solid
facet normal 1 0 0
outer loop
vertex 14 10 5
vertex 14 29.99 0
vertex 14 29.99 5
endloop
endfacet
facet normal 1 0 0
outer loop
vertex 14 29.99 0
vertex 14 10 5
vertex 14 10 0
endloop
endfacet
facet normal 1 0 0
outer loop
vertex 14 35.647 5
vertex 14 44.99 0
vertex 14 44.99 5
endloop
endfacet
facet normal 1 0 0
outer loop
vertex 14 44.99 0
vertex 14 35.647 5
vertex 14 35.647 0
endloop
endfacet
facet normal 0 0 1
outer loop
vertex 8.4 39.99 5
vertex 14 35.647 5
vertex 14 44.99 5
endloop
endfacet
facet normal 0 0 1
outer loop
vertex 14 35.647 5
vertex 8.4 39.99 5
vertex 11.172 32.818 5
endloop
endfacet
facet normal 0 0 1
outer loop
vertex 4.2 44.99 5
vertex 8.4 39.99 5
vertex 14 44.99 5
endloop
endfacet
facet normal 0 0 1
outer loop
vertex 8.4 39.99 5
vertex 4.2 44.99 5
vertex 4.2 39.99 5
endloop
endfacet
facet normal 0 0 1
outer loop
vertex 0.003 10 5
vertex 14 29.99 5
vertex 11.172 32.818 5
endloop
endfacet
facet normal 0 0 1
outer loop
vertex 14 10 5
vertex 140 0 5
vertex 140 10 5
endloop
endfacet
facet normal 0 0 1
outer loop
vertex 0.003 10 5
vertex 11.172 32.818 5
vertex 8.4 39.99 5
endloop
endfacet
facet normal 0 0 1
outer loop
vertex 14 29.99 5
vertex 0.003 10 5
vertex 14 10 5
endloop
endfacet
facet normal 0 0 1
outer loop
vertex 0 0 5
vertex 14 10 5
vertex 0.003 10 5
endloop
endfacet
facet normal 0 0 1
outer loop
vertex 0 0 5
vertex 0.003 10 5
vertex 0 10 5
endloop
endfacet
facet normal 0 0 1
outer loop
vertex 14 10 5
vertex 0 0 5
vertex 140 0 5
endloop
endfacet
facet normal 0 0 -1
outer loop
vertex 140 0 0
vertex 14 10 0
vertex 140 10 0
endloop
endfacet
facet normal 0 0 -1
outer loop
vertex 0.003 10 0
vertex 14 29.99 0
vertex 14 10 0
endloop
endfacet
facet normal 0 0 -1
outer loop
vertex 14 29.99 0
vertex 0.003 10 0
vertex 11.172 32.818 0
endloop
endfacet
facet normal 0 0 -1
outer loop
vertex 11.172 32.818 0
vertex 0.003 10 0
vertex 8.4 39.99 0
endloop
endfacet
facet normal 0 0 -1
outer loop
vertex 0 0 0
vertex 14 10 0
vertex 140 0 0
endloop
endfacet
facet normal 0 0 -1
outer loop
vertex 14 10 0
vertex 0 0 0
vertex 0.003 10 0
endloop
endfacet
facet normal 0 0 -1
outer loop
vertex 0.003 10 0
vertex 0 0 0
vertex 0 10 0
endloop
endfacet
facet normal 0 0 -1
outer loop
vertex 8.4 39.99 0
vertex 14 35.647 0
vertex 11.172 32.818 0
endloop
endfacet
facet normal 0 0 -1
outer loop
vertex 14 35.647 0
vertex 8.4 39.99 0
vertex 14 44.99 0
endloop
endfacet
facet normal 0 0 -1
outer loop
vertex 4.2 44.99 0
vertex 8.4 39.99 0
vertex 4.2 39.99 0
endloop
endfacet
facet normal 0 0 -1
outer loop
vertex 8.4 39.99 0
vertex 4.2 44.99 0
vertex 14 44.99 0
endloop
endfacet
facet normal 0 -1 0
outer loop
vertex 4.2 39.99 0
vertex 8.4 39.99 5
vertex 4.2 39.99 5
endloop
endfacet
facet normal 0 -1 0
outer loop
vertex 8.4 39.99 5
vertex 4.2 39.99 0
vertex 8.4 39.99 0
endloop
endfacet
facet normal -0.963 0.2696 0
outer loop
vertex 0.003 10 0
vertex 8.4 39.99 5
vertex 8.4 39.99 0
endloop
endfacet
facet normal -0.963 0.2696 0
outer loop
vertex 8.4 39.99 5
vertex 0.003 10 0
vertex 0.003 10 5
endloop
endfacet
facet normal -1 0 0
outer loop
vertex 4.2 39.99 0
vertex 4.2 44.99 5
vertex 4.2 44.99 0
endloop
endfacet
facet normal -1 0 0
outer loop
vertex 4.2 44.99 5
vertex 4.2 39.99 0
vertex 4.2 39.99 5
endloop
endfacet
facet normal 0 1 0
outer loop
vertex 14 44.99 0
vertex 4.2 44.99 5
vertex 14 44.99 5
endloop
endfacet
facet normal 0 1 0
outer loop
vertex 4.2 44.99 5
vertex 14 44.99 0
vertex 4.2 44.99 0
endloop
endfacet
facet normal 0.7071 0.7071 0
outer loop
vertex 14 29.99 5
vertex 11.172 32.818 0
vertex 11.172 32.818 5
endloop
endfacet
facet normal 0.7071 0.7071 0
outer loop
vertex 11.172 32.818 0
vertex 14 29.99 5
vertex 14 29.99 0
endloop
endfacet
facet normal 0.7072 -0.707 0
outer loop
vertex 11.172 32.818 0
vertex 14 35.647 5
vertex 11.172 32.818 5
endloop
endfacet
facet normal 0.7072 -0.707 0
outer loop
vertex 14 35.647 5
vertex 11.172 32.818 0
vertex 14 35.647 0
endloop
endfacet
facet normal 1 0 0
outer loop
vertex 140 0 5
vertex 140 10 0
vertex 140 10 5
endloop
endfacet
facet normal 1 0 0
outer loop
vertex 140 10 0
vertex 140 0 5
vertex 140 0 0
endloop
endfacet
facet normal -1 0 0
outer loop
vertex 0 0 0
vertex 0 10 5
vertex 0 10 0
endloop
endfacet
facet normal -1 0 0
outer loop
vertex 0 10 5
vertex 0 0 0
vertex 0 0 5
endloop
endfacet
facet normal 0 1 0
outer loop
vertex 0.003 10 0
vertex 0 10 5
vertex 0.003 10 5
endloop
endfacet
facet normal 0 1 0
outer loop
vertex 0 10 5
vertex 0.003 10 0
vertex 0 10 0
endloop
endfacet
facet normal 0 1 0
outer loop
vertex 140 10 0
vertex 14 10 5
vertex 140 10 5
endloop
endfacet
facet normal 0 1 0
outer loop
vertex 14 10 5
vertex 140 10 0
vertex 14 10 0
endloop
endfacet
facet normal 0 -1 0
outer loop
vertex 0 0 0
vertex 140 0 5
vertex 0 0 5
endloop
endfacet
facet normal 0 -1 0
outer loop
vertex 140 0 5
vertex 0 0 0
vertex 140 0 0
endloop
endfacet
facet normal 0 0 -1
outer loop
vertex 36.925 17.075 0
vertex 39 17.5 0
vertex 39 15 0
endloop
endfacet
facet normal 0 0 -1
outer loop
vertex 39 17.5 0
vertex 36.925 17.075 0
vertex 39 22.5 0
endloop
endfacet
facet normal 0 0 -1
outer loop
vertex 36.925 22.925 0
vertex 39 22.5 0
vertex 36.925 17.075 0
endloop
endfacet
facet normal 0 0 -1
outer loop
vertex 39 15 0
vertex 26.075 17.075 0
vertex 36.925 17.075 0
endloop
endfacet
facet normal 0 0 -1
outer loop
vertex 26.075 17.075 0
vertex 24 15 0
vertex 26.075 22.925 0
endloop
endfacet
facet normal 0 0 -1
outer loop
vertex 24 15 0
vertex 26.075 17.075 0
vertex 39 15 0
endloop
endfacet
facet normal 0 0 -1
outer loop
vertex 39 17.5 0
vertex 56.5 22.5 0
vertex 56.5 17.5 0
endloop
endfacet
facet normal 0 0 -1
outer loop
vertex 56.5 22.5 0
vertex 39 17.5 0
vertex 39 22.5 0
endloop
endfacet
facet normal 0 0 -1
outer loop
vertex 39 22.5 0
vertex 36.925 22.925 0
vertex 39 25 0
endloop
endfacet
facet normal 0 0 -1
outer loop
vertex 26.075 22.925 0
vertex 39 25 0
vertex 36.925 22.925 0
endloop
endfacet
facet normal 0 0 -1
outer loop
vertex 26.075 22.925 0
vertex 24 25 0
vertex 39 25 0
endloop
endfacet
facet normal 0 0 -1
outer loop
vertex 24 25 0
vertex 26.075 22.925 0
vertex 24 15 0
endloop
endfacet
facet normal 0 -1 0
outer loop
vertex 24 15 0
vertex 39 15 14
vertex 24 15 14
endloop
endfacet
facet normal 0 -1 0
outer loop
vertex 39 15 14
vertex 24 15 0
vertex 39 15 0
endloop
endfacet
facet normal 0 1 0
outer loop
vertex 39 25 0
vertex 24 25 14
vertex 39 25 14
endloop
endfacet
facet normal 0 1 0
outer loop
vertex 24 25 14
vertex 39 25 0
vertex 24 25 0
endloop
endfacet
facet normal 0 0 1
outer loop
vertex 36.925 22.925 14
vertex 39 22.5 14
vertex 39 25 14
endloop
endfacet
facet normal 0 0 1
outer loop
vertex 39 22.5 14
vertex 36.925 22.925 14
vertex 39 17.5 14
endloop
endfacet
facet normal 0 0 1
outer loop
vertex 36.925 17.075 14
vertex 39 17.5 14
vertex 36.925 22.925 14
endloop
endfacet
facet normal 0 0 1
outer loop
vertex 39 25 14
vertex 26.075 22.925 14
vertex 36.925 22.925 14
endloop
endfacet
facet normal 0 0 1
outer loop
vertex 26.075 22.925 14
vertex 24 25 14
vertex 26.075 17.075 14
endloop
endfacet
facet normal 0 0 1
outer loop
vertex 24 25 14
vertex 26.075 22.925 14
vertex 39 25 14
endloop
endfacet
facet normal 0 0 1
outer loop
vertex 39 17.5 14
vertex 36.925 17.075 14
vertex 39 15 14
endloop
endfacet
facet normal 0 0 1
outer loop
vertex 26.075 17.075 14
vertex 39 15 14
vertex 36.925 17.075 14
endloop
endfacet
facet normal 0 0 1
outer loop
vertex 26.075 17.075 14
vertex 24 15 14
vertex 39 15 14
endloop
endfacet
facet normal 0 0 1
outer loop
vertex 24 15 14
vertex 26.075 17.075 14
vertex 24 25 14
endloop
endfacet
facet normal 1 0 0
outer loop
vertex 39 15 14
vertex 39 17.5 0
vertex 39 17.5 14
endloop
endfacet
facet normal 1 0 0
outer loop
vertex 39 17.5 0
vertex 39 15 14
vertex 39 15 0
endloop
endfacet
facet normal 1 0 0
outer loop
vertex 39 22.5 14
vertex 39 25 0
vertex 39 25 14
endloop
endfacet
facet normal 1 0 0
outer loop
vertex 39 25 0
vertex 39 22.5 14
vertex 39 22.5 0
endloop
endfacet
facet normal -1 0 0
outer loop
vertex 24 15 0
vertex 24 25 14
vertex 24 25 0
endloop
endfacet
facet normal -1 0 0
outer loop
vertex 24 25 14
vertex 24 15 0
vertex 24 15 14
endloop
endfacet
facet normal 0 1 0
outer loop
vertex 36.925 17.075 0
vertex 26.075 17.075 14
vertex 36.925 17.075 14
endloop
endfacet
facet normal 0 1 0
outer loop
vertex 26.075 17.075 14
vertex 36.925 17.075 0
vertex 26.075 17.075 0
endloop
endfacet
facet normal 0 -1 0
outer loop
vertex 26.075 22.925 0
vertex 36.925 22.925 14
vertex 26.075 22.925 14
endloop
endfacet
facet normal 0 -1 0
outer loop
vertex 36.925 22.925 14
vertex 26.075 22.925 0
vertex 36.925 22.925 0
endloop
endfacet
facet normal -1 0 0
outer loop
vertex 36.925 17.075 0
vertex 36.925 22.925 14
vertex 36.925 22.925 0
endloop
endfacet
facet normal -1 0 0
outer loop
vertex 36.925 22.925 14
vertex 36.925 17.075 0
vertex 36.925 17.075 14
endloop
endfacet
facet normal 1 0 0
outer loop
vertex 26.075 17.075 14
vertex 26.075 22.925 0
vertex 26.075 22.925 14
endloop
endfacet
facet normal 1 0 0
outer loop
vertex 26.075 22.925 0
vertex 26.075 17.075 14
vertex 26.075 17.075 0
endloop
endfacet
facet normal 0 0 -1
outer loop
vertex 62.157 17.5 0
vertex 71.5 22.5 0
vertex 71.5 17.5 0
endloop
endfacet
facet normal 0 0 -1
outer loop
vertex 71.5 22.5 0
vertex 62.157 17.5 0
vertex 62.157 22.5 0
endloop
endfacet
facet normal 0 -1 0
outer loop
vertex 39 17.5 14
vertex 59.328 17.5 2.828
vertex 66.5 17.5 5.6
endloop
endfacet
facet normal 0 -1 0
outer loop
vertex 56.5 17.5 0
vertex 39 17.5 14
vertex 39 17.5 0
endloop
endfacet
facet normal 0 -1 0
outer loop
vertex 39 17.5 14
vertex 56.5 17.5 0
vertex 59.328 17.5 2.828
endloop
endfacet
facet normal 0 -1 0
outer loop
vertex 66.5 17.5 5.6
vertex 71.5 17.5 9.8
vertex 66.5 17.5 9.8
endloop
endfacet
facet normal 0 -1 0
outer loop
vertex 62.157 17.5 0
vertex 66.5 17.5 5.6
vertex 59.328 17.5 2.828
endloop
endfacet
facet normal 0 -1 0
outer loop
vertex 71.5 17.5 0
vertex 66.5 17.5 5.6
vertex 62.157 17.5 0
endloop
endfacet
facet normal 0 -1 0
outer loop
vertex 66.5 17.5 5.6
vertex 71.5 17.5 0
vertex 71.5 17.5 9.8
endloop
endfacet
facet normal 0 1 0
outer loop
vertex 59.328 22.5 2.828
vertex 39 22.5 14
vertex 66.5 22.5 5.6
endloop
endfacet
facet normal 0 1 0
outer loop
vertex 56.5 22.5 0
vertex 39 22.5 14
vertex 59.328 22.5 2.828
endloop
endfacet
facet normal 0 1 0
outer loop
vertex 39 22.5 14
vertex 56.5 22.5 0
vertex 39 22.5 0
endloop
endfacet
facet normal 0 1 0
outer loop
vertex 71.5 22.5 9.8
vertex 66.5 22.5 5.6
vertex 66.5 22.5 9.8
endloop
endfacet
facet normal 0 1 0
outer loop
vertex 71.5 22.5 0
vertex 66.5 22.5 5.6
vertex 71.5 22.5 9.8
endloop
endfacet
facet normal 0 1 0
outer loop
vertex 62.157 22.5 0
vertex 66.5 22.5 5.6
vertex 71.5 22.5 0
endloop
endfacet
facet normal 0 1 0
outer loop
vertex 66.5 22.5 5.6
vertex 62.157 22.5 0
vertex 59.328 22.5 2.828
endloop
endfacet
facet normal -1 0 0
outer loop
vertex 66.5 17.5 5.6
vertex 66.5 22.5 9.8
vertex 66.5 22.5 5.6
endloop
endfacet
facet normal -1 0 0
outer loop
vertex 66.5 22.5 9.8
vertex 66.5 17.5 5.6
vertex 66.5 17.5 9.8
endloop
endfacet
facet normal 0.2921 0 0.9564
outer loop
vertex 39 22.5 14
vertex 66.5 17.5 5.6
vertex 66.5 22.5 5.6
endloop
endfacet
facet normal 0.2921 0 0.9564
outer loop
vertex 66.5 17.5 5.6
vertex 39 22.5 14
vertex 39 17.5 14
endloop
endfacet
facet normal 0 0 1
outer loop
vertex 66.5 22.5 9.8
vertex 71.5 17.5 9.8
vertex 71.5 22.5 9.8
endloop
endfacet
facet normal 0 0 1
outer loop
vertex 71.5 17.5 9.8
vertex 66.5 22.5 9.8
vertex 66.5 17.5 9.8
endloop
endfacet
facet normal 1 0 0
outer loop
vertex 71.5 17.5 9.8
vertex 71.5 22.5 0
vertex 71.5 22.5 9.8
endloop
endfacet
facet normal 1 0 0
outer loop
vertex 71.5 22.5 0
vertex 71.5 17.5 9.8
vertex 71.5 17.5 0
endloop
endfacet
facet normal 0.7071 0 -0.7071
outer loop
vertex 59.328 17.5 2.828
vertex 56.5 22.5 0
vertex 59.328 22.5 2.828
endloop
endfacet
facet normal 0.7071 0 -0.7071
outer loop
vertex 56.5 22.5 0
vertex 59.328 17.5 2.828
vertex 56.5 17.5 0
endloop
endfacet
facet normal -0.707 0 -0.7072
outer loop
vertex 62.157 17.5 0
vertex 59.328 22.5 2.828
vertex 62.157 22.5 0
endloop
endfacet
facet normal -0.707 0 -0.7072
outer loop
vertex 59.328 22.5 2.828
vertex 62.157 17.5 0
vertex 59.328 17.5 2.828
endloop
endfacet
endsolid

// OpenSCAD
// [FL_INDEX: keywords="openscad, 3d_parametric, Slide_Clamp, csg_solid" | COT="Parametric OpenSCAD design from 3DCodeverse"]
// Title: Slide Clamp

/*
  Slide Clamp
  version 1.0
  2013-06-06
  by Kirk Saathoff
*/


/* [Global] */

// Rod Length is the total lenth of the clamp
rodLen = 140;

// Rod Width is the width of the clamp rod
rodWidth = 10;

// Rod Thickness is the thickess of the clamp rod
rodThickness = 5;

// Jaw Length
jawLen = 30;

// Jaw Width
jawWidth = 14;

// Vee Depth
veeDepth = 4;

// Clearance for slider opening
clearance = 0.85;

/* [Hidden] */

hookLen = jawWidth*.7;

slideWidth = rodWidth+rodThickness;
slideDepth = rodThickness*2;

clearanceHalf = clearance/2;

module hook()
{
//	color("red")
        	cube([hookLen, rodThickness*1, rodThickness]);
}

module vee(_jawLen)
{
	echo("jawLen in vee", _jawLen);
//	color("red")
	translate([jawWidth, _jawLen-rodThickness*2, -0.01])
	rotate([0, 0, 45])
	{
        	cube([veeDepth, veeDepth, rodThickness+.02]);
	}
}

module Jaw(offset)
{
//	echo("jawLen", jawLen);

	_jawLen = jawLen + offset;
	echo("_jawLen in Jaw", _jawLen);

	jawAngle = atan((jawWidth*.6)/_jawLen);
	jawHyp = jawLen/cos(jawAngle);

	difference() {
		union() {
			difference()
			//union() 
			{
		     	cube([jawWidth, _jawLen, rodThickness]);
		    		 	rotate(-jawAngle) { 
						translate([-jawWidth, 0, -0.01]) 
							cube([jawWidth, jawHyp, rodThickness+.02]);
				}
			}
		    translate([jawWidth-(hookLen), _jawLen, 0]) hook();
		}
	    vee(_jawLen);
	}
}

module slider()
{
//    jawLen = 25;
	union() {
		difference()
		//union() 
		{
			cube([jawWidth, slideWidth, slideDepth]);
			translate([-0.01, (slideWidth/2-(rodWidth/2))-clearanceHalf, 
				(slideDepth/2-(rodThickness/2))-clearanceHalf]) {
				cube([jawWidth+.02, rodWidth+clearance, rodThickness+clearance]);
			}
		}
		translate([0, slideWidth, (slideDepth/2)-(rodThickness/2)]) {
			Jaw(-5/2);
		}
	}
}

module rod()
{
	union()
	{
		cube([rodLen, rodWidth, rodThickness]);
		translate([0, rodWidth-0.01, 0]) {
			Jaw(0);
		}
	}
}

module print_part() {

	rod();
	translate([jawWidth+rodThickness+5, 15+slideDepth, jawWidth]) {
		rotate([0, 0, 0])
		rotate([90, 90, 0])
		{
			slider();
		}
	}
}

print_part();
